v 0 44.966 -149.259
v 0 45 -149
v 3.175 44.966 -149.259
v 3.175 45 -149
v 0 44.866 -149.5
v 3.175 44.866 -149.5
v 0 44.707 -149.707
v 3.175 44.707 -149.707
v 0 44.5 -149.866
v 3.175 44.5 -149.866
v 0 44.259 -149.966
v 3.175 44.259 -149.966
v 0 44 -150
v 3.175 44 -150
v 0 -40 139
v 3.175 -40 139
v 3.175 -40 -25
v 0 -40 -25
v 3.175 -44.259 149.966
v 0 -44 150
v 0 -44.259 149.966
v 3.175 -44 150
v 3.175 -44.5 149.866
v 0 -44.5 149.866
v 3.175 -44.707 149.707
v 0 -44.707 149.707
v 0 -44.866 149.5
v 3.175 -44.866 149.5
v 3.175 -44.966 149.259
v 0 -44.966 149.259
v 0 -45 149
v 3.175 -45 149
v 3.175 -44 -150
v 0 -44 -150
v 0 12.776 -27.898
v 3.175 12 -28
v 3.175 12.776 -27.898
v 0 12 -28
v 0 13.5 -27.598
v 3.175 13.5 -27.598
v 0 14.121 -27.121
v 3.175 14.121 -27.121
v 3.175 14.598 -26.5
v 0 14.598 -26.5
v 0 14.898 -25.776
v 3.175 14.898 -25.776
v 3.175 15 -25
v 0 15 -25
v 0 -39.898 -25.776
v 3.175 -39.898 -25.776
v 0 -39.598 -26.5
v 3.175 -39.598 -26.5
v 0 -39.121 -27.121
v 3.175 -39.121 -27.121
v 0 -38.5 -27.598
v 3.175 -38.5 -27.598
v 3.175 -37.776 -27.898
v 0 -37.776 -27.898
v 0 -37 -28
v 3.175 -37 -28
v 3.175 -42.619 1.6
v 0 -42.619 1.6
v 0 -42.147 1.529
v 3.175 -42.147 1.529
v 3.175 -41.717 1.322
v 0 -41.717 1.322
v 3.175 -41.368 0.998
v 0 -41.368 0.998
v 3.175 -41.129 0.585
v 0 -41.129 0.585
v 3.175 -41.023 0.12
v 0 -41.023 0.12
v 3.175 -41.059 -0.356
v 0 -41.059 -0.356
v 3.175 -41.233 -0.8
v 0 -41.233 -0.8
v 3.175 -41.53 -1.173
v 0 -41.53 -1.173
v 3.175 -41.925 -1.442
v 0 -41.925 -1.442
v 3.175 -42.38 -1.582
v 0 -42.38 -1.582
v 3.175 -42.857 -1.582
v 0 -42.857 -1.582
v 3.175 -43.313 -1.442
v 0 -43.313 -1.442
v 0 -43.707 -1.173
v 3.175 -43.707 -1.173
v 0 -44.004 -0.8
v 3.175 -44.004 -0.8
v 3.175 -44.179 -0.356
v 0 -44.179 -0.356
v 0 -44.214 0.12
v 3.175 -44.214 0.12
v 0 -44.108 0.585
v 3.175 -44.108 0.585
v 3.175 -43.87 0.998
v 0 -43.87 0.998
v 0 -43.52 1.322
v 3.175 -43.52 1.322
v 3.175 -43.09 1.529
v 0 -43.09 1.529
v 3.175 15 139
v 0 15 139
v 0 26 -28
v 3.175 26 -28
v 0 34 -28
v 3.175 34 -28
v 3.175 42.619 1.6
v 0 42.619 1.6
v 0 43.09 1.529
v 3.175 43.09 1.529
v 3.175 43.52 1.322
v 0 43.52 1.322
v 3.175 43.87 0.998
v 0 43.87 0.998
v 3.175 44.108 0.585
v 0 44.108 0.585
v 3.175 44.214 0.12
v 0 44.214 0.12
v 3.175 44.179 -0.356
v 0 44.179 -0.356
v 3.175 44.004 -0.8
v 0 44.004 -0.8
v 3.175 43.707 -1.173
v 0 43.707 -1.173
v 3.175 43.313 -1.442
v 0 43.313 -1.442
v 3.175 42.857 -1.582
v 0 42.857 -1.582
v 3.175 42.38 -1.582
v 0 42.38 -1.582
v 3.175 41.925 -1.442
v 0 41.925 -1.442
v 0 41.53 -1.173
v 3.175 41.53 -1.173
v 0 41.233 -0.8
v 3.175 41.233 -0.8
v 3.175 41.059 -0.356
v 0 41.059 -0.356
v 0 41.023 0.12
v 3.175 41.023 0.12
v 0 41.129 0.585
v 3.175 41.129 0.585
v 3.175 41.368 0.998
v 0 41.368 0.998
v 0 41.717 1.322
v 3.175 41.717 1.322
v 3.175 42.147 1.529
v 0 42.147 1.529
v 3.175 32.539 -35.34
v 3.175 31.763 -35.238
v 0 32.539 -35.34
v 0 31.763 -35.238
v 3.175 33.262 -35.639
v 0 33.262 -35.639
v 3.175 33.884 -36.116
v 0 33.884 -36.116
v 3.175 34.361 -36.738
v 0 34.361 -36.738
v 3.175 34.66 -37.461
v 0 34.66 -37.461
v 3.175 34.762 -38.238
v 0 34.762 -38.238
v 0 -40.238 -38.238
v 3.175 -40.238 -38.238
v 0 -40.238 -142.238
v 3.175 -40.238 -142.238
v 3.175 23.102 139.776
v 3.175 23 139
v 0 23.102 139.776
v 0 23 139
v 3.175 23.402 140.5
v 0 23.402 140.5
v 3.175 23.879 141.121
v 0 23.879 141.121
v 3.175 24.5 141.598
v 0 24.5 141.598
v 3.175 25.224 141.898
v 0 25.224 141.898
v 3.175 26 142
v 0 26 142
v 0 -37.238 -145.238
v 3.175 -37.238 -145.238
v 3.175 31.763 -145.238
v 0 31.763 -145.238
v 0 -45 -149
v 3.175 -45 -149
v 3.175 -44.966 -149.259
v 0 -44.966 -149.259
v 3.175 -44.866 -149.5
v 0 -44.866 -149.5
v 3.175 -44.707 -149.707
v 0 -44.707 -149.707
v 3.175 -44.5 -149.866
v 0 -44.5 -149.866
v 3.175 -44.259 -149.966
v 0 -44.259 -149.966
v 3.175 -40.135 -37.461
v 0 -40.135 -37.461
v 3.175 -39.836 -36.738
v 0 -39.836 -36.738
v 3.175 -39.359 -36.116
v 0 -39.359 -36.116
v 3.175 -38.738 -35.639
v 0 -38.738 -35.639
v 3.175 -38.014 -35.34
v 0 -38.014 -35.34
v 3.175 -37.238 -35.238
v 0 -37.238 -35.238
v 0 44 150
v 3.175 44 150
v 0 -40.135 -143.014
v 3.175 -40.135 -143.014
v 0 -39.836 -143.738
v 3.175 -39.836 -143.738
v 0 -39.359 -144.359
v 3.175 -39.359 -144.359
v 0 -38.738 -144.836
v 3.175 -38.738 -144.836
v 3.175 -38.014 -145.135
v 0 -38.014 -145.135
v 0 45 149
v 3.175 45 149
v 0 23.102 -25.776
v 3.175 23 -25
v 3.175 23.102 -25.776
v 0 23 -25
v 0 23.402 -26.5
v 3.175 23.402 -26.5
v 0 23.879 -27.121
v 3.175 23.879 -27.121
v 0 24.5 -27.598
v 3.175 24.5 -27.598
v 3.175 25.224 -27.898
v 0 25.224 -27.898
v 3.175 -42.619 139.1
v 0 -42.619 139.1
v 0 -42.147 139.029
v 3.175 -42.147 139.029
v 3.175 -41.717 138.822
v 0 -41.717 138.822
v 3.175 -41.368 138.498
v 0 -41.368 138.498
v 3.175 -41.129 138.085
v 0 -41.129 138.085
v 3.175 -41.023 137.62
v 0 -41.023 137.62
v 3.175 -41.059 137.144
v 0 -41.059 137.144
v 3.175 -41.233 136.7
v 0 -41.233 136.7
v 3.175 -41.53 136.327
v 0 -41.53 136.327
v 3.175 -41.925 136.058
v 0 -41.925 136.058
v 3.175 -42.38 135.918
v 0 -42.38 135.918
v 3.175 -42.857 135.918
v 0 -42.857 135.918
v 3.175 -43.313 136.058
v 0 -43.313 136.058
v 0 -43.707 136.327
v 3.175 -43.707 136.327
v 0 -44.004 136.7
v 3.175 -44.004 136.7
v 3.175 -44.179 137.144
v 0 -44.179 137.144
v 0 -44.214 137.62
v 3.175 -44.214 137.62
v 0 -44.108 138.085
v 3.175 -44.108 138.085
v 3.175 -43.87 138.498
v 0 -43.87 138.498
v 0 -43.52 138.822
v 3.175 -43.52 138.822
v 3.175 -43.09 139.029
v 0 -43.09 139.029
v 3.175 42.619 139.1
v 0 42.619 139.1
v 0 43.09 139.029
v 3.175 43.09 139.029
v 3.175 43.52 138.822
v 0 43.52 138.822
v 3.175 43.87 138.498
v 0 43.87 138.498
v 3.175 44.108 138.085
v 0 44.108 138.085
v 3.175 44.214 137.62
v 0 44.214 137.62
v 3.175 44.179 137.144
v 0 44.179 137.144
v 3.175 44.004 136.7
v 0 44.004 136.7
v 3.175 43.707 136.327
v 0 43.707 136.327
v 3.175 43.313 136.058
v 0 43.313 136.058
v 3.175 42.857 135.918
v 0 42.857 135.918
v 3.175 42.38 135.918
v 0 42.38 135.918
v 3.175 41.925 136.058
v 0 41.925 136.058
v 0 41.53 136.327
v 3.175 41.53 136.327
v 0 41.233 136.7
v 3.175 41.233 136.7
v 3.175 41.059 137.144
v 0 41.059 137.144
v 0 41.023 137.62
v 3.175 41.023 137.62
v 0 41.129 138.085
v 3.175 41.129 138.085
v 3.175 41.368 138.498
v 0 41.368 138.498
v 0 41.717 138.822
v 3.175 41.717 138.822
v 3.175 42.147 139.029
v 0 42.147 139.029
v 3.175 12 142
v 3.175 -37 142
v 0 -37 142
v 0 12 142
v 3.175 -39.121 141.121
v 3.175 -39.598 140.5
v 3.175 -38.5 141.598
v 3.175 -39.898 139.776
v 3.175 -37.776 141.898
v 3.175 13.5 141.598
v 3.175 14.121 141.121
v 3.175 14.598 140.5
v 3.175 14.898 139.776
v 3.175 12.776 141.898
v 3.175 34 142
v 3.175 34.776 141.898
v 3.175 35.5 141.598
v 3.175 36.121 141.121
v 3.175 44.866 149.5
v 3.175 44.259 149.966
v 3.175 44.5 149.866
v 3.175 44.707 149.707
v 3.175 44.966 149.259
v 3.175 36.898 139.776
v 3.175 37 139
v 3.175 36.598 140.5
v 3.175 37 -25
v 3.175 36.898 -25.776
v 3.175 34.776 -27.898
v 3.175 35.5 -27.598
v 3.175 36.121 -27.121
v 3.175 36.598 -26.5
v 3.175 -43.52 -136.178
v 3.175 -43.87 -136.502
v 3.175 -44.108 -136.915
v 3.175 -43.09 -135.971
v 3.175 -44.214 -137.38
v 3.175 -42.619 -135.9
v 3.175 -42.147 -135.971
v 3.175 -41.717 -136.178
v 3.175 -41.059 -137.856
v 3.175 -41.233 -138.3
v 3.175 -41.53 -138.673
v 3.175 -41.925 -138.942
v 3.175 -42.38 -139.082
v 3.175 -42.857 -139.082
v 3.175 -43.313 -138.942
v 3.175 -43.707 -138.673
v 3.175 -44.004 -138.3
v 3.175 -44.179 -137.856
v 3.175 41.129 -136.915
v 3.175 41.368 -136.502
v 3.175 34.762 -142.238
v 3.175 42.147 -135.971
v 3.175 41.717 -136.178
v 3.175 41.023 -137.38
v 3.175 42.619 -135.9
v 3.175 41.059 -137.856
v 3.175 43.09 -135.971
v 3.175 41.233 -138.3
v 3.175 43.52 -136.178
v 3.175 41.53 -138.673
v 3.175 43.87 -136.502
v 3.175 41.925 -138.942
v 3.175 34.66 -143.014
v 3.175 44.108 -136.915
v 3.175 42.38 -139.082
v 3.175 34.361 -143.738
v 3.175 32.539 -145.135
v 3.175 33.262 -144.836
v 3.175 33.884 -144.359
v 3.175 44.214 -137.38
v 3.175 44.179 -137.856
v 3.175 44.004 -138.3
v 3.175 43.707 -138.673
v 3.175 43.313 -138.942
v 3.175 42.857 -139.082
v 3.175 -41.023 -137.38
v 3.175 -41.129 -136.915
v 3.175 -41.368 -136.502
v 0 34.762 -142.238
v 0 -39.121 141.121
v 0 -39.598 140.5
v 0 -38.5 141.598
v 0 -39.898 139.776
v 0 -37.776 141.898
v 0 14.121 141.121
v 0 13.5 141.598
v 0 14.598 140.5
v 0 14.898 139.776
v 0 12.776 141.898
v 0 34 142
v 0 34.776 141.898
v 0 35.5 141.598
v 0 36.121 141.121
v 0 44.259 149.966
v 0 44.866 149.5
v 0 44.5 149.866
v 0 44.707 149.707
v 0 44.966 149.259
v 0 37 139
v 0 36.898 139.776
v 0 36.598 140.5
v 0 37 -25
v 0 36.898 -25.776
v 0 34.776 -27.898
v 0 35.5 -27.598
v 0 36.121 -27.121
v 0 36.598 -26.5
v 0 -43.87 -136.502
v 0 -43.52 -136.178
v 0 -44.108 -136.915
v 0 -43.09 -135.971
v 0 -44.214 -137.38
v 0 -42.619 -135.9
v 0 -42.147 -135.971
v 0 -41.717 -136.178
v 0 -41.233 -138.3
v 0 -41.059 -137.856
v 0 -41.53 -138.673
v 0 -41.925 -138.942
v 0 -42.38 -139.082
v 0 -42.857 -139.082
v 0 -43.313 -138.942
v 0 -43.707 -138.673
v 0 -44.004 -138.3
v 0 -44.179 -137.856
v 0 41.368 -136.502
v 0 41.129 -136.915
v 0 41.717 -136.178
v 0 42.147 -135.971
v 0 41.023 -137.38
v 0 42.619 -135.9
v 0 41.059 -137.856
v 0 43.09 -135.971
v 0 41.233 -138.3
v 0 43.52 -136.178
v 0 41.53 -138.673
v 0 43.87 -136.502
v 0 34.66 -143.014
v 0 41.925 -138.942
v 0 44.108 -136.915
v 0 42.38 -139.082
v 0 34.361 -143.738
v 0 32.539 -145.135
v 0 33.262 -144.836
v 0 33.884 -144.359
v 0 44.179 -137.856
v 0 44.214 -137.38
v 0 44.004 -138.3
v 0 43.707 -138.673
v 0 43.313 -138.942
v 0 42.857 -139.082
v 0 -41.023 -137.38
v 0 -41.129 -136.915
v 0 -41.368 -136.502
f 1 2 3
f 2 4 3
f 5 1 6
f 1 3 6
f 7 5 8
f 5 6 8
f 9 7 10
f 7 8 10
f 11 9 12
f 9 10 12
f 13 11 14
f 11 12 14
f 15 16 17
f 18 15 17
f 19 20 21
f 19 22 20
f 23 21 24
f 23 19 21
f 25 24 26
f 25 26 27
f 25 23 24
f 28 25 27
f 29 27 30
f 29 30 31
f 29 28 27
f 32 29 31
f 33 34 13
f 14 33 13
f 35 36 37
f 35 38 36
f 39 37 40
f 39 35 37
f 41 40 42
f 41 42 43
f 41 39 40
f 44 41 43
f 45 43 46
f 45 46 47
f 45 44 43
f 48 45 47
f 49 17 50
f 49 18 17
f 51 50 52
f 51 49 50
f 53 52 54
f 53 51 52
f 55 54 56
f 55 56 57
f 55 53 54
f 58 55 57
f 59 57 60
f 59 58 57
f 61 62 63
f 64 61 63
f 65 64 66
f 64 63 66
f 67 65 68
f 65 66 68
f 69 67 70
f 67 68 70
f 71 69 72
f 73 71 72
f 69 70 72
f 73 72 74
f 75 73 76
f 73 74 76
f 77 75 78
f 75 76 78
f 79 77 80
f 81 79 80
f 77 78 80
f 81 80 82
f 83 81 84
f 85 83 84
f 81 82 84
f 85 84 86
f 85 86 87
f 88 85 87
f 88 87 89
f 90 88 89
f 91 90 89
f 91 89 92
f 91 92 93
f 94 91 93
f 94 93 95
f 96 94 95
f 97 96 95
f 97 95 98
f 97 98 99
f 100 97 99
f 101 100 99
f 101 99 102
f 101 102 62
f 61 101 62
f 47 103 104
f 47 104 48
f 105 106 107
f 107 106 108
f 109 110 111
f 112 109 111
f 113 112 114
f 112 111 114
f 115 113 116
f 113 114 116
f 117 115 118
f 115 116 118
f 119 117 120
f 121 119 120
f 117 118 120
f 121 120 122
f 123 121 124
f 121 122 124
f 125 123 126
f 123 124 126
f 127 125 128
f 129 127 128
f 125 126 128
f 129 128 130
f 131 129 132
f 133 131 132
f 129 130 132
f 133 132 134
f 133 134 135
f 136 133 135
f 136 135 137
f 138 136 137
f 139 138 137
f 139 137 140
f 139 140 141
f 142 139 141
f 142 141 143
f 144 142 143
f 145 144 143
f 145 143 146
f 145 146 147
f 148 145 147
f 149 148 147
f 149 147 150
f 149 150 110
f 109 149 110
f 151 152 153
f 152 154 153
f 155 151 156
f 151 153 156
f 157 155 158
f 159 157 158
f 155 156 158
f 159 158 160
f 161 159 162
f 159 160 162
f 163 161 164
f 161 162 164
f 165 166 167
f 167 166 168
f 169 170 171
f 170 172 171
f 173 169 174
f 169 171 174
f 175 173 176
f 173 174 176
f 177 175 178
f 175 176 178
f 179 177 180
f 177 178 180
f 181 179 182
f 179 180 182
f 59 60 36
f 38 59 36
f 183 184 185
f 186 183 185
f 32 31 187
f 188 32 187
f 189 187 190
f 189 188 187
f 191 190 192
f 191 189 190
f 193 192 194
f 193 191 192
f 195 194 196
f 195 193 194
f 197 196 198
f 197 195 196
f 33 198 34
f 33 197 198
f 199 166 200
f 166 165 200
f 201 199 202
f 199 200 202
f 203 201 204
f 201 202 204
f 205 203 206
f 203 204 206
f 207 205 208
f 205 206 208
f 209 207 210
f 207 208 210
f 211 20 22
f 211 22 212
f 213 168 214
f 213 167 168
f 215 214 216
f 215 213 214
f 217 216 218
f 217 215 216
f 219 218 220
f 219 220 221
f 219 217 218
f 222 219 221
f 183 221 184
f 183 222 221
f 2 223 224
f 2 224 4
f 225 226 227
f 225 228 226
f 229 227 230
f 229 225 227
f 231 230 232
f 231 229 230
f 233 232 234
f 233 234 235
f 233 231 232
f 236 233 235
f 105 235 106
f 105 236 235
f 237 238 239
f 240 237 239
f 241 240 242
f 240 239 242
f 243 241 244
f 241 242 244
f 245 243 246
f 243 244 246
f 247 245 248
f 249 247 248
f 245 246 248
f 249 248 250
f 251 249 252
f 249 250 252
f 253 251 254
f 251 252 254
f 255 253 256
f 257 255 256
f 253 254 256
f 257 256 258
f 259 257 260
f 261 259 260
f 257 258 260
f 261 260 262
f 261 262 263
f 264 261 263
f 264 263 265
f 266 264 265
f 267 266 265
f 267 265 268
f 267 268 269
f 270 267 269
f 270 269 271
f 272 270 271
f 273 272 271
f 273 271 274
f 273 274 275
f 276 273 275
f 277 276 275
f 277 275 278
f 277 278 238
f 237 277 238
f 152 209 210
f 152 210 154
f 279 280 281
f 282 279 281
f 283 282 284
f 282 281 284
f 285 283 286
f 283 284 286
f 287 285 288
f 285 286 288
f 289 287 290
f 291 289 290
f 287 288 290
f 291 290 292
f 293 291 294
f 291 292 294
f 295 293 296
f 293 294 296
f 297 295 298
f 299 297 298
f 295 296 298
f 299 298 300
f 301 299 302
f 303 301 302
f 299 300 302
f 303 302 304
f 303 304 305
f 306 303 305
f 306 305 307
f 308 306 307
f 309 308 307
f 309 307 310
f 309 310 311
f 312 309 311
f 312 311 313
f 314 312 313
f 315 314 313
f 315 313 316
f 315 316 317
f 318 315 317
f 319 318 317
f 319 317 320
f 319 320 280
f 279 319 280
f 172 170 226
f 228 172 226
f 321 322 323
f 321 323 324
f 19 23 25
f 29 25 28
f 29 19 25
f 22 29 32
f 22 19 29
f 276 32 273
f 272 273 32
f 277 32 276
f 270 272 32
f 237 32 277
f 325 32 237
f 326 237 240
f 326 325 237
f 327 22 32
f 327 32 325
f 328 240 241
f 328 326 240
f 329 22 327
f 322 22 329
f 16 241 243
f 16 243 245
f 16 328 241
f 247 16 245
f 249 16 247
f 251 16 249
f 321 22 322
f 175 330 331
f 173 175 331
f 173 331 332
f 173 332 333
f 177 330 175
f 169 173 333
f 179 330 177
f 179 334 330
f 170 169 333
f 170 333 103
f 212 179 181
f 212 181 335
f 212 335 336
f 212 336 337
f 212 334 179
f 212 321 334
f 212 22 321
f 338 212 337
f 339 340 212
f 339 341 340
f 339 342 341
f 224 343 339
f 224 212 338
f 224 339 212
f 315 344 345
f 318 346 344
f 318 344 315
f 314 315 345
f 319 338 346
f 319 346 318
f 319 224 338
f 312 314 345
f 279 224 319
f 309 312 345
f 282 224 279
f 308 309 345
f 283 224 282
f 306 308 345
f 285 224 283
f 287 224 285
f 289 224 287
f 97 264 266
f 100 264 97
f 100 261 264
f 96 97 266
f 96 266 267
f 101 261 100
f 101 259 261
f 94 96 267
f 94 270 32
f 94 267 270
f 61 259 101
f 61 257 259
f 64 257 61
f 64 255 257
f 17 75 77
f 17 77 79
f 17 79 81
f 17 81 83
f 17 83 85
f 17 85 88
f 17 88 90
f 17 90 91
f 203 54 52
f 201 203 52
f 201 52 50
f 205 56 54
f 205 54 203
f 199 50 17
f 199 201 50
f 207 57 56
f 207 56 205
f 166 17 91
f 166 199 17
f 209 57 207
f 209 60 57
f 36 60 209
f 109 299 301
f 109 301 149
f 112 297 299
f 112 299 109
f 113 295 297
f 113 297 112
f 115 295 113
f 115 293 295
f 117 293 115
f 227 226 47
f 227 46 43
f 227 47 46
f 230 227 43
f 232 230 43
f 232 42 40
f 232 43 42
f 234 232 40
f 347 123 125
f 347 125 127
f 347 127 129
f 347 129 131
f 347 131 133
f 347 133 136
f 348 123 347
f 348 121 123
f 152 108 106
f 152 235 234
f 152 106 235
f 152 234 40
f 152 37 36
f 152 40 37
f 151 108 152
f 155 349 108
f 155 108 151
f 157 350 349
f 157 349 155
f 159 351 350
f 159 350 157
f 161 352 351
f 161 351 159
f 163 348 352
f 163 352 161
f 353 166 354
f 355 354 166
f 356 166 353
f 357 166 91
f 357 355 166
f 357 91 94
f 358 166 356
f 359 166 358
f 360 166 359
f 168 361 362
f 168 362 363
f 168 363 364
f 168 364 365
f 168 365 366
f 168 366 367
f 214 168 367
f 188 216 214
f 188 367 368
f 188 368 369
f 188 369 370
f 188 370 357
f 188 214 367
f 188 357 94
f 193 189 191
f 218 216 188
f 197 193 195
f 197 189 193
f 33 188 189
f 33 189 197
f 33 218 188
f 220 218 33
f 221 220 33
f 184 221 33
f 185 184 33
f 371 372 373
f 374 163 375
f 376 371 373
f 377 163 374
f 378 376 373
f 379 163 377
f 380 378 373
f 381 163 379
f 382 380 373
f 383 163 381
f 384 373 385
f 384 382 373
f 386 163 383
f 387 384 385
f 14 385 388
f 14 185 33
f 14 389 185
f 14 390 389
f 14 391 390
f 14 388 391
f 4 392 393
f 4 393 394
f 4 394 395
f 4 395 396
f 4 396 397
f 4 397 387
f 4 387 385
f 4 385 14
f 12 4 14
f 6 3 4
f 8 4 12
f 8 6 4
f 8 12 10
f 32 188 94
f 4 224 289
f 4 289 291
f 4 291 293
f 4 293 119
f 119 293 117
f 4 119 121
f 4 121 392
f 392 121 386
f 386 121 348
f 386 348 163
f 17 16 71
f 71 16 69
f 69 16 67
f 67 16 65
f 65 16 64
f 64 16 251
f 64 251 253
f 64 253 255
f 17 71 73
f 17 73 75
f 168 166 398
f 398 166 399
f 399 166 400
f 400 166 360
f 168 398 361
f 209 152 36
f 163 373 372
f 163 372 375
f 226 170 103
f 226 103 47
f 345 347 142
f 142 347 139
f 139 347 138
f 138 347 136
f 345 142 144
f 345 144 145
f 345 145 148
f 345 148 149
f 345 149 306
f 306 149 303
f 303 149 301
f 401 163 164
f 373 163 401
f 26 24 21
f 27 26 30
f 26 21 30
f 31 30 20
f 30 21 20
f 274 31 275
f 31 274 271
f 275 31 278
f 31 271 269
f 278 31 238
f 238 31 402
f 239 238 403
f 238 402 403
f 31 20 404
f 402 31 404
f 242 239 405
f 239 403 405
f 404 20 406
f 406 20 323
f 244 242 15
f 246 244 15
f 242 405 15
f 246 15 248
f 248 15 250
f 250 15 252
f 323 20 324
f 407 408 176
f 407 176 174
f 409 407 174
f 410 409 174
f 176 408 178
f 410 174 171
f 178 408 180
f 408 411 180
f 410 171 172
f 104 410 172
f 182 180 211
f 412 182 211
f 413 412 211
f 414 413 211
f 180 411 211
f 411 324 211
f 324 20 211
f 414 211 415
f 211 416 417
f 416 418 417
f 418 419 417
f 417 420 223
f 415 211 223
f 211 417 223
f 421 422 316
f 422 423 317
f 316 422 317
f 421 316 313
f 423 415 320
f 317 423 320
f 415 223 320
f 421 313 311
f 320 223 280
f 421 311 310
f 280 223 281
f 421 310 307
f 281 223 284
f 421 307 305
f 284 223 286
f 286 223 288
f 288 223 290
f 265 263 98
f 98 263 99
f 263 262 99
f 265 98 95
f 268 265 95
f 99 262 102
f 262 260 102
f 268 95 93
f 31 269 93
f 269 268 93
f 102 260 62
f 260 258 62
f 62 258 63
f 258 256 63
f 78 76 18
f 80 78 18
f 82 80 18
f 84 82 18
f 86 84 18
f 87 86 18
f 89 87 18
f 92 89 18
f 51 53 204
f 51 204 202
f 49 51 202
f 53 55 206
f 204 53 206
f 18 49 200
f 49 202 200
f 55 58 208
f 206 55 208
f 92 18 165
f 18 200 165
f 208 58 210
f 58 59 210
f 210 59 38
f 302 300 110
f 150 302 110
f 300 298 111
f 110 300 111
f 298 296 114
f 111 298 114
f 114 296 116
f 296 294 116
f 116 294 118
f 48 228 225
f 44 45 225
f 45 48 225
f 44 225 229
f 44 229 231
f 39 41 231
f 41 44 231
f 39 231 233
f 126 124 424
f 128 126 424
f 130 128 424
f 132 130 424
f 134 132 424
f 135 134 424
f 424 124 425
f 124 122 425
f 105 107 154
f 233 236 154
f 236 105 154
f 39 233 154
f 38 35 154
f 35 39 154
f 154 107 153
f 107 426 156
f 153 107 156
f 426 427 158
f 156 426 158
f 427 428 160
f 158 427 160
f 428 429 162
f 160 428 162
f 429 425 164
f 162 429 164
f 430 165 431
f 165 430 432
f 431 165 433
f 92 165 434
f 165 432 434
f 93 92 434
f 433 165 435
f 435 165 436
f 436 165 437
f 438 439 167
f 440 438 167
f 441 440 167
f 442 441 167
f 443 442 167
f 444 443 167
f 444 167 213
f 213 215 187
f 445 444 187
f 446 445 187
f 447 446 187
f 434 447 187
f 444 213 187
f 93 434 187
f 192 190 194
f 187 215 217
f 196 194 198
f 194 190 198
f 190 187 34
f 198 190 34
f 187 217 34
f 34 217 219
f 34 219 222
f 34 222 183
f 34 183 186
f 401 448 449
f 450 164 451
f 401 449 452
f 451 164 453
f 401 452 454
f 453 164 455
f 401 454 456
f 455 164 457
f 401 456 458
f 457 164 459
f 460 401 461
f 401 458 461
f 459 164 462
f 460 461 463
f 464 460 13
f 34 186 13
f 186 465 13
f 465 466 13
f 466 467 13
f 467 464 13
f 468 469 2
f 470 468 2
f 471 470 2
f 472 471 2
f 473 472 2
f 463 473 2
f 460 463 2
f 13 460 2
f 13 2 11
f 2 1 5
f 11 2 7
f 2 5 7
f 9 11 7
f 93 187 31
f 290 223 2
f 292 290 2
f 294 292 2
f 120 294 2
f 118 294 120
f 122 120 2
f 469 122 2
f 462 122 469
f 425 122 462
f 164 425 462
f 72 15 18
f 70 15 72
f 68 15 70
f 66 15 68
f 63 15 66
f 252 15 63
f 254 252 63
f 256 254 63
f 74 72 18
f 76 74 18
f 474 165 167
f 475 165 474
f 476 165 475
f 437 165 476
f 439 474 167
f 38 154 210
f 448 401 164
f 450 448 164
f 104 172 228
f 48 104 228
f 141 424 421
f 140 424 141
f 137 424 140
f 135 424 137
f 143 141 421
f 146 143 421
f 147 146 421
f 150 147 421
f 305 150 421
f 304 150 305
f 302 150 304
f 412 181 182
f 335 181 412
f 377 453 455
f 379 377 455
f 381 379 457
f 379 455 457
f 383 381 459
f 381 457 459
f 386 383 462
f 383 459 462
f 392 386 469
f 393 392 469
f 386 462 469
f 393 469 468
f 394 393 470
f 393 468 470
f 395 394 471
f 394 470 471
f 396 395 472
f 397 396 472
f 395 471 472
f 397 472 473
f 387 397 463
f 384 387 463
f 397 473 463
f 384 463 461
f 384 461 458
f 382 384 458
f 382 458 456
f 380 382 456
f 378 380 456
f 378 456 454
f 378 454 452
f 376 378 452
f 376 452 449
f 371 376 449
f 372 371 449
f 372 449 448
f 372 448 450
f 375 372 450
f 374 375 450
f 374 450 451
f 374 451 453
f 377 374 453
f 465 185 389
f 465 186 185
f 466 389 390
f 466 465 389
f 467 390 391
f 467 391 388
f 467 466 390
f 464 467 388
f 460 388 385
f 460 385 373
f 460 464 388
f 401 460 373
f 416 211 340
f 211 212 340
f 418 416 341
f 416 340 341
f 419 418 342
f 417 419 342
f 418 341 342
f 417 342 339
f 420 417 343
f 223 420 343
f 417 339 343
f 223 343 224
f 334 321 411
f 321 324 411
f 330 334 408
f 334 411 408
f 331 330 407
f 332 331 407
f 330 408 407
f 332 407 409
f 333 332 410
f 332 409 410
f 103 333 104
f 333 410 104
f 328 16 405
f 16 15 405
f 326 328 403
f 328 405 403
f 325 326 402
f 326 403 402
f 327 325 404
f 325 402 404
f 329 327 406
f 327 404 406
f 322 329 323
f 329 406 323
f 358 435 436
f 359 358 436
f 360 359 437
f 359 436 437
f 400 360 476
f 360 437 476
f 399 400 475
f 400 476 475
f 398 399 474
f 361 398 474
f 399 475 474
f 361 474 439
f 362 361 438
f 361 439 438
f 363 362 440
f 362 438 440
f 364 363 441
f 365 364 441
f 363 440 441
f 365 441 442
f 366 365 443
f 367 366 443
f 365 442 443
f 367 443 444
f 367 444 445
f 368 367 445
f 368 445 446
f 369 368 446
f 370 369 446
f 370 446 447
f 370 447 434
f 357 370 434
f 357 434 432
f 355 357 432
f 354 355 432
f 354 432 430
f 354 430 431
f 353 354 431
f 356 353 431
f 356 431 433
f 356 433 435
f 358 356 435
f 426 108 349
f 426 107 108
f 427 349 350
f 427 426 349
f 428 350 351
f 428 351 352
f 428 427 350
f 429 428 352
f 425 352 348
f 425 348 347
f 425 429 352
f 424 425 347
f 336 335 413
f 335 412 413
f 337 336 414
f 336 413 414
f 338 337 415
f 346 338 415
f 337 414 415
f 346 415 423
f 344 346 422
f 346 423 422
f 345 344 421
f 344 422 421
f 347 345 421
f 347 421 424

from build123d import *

# Parameters (mm, degrees)
SKETCH2_W            = 300
SKETCH2_H            = 90
BOSS_EXTRUDE1_DEPTH  = 3.175
SKETCH4_W            = 170
SKETCH4_H            = 55
SKETCH4_W_2          = 110
SKETCH4_H_2          = 75
SKETCH4_H_3          = 14
CUT_EXTRUDE2_DEPTH   = 157.636779286
M3_CLEARANCE_HOLE1_D = 3.2
FILLET1_R            = 3
FILLET2_R            = 1


with BuildPart() as part:
    # Sketch2 → Boss-Extrude1 (new body)
    with BuildSketch(Plane(origin=(0, 0, 0), x_dir=(0, 0, -1), z_dir=(1, 0, 0))):
        Rectangle(SKETCH2_W, SKETCH2_H)
    extrude(amount=BOSS_EXTRUDE1_DEPTH)

    # Sketch4 → Cut-Extrude2 (cut, through all)
    with BuildSketch(Plane(origin=(3.175, 0, 0), x_dir=(0, 0, -1), z_dir=(1, 0, 0))):
        with Locations((-57, -12.5)):
            Rectangle(SKETCH4_W, SKETCH4_H)
        with Locations((90.2375, -2.7375)):
            Rectangle(SKETCH4_W_2, SKETCH4_H_2)
        with Locations((-57, 30)):
            Rectangle(SKETCH4_W, SKETCH4_H_3)
    extrude(amount=-CUT_EXTRUDE2_DEPTH, mode=Mode.SUBTRACT)

    # M3 Clearance Hole1 (through all)
    with Locations(Plane(origin=(3.175, 0, 0), x_dir=(0, 0, -1), z_dir=(1, 0, 0))):
        with Locations((-137.5, 42.61875), (0, 42.61875), (137.5, 42.61875), (137.5, -42.61875), (0, -42.61875), (-137.5, -42.61875)):
            Hole(M3_CLEARANCE_HOLE1_D / 2)

    # Fillet1
    fillet1_edges = [part.edges().sort_by_distance(p)[0] for p in [
        (1.5875, 34.7625, -145.2375),
        (1.5875, -40.2375, -145.2375),
        (1.5875, -40.2375, -35.2375),
        (1.5875, 34.7625, -35.2375),
        (1.5875, -40, 142),
        (1.5875, 15, 142),
        (1.5875, 15, -28),
        (1.5875, -40, -28),
        (1.5875, 23, 142),
        (1.5875, 37, 142),
        (1.5875, 37, -28),
        (1.5875, 23, -28),
    ]]
    fillet(fillet1_edges, radius=FILLET1_R)

    # Fillet2
    fillet2_edges = [part.edges().sort_by_distance(p)[0] for p in [
        (1.5875, -45, -150),
        (1.5875, -45, 150),
        (1.5875, 45, 150),
        (1.5875, 45, -150),
    ]]
    fillet(fillet2_edges, radius=FILLET2_R)


solid = part.part
